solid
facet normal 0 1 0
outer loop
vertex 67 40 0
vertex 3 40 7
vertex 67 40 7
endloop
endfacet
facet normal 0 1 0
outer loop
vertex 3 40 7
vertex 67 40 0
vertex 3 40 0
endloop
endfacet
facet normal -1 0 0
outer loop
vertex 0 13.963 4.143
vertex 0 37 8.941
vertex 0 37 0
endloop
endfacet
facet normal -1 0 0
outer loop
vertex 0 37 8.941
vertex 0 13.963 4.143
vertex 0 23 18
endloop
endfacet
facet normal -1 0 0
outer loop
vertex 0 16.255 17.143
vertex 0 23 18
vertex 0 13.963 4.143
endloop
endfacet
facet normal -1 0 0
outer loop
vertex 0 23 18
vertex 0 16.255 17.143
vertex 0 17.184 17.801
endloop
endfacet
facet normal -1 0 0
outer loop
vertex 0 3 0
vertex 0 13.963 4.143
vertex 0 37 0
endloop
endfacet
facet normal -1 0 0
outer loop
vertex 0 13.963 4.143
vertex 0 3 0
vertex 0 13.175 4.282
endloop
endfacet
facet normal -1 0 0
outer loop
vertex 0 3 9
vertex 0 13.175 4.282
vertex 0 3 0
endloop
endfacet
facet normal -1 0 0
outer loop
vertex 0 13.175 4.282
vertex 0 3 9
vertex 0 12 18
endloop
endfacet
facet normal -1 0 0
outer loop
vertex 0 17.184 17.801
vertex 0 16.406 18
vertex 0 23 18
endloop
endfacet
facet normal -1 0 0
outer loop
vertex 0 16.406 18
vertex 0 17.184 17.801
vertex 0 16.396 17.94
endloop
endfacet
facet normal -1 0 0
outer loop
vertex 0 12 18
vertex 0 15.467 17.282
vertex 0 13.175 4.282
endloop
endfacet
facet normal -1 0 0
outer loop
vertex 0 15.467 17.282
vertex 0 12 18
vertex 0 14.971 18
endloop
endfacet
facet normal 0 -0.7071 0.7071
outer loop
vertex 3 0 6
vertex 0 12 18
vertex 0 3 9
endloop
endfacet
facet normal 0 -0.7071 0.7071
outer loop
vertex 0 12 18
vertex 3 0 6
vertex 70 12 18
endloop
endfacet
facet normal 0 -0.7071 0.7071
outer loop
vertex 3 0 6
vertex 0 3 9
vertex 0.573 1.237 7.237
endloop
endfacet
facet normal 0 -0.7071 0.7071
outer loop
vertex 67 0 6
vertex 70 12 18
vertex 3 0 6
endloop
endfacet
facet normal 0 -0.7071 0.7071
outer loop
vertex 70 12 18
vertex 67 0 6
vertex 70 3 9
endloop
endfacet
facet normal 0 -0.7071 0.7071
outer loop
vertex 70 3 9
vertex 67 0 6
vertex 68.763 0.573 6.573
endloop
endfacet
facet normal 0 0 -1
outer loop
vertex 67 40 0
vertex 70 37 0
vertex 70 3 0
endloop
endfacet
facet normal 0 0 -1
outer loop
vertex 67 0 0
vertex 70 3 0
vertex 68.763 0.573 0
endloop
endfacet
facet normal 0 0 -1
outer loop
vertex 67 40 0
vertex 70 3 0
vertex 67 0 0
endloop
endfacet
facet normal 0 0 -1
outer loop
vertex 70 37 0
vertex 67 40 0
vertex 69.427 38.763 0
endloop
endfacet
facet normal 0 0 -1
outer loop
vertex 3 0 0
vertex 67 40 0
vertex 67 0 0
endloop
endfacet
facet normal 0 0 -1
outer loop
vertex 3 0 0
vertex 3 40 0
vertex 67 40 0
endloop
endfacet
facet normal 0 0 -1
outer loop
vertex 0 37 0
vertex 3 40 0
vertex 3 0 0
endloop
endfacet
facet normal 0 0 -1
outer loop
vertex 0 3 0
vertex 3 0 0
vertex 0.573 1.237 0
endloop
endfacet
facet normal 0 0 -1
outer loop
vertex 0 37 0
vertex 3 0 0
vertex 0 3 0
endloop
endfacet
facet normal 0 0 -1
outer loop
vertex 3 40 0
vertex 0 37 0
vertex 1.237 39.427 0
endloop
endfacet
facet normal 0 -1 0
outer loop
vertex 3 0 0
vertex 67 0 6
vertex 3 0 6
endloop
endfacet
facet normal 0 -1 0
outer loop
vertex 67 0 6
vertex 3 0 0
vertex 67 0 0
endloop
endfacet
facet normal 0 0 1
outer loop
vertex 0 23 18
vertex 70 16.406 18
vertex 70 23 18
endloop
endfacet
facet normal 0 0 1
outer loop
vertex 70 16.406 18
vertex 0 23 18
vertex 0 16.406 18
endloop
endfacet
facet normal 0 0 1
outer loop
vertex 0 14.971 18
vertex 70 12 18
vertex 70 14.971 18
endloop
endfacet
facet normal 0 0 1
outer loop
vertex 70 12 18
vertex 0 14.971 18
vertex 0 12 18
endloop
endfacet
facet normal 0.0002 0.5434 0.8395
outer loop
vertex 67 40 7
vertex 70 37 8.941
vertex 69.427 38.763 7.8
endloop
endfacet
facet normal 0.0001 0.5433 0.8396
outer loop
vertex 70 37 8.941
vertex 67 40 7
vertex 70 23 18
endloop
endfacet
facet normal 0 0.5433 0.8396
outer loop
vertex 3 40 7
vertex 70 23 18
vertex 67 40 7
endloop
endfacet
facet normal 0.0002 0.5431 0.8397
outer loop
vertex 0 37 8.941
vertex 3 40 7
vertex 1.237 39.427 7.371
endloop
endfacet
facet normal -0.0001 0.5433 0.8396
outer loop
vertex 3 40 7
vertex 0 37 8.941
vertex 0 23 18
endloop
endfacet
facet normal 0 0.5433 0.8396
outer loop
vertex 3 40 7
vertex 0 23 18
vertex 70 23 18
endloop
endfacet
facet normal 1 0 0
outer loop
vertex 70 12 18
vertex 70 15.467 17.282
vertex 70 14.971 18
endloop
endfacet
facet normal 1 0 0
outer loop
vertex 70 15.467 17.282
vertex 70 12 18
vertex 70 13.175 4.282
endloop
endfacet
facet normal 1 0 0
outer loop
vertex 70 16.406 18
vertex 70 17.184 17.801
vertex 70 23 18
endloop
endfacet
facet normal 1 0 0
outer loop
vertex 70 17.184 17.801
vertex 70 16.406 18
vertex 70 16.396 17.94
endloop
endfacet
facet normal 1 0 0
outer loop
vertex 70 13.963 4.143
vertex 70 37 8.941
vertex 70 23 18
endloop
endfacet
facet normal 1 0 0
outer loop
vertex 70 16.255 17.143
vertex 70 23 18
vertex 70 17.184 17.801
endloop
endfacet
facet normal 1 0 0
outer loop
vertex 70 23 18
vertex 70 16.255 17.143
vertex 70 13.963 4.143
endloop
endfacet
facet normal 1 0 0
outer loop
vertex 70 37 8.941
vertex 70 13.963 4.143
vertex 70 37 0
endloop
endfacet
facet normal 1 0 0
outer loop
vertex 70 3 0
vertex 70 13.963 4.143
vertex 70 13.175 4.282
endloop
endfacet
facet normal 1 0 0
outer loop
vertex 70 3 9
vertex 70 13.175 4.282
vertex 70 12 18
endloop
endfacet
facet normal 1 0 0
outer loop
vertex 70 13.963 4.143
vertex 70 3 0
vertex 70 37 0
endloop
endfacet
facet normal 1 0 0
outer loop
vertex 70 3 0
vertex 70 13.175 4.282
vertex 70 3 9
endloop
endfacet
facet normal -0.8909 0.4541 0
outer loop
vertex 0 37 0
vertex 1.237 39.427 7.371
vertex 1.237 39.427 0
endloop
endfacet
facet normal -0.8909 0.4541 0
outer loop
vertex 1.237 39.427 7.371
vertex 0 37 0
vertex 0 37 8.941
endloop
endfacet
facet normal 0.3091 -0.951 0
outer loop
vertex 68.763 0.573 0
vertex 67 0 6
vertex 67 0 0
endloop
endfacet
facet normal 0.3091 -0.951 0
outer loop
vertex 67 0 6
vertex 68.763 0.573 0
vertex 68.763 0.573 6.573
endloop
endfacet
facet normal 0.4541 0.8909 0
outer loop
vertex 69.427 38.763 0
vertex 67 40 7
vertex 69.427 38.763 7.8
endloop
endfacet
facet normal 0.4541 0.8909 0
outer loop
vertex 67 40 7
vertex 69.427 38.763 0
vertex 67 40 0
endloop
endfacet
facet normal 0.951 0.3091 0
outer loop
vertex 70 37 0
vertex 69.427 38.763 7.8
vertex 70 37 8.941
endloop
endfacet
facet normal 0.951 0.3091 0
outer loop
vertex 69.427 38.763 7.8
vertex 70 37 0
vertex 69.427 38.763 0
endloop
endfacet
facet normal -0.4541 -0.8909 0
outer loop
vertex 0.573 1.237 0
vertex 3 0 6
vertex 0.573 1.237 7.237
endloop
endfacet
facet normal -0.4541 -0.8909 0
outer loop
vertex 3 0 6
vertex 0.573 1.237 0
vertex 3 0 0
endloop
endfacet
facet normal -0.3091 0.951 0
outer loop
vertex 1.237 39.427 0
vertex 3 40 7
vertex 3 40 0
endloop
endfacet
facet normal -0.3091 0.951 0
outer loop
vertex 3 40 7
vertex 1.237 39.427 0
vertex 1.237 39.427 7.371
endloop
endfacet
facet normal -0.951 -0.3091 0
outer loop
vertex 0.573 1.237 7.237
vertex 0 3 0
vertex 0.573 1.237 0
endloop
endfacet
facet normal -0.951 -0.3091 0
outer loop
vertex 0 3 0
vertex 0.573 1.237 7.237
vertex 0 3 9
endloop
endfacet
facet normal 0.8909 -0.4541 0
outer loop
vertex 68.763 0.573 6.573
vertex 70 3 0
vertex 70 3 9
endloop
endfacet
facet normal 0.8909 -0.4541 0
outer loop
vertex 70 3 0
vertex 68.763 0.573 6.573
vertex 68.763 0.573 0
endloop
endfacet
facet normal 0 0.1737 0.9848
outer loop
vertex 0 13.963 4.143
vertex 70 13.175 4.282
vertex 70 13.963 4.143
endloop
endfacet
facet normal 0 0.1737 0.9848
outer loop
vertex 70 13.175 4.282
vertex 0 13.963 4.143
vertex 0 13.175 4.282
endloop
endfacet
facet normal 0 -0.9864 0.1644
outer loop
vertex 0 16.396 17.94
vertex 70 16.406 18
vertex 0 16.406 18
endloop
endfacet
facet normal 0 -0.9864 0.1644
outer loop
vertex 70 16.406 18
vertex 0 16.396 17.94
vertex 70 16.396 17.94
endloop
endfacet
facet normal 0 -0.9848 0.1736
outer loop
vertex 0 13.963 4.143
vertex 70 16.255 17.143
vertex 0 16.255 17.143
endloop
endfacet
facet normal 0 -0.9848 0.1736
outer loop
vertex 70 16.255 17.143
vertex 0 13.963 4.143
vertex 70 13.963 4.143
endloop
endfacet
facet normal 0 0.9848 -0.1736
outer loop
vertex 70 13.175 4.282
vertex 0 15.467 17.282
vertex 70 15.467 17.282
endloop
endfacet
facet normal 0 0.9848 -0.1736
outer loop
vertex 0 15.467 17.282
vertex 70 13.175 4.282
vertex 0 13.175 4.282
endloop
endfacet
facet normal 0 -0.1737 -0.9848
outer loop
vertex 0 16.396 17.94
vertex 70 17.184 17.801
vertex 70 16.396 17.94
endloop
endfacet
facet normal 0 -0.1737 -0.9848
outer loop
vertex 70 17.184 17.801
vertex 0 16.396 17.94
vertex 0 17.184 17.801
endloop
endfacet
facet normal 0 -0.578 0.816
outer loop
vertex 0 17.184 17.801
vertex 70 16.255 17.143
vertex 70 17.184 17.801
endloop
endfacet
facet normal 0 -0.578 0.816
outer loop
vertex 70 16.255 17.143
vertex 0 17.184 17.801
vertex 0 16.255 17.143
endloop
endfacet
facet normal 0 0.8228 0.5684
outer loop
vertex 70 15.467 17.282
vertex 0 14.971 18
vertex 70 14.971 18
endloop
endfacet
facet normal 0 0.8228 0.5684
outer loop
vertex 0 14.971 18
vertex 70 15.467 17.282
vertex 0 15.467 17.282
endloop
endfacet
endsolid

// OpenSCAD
// Stand for A6 landscape cards (148 x 105 mm, 250 g card stock).
// The slot leans back by `tilt` degrees. Print lying on the flat bottom,
// no supports needed. Set grid_x/grid_y > 1 to get a whole print plate.
// Tested with OpenSCAD 2021.01.

/* [Card] */
card_t      = 0.3;      // card stock thickness (250 g ~ 0.3 mm, laminated ~0.5-0.8 mm)
slot_extra  = 0.5;      // extra slot width so the card slides in easily
tilt        = 10;       // backward tilt in degrees

/* [Stand] */
len         = 70;       // along the card width
depth       = 40;       // front to back
front_h     = 6;        // height at the front edge
back_h      = 18;       // height at the slot
back_end_h  = 7;        // height at the back edge
slot_y      = 16;       // slot position from the front edge (at the top)
slot_depth  = 14;       // measured along the slot
corner_r    = 3;

/* [Plate] */
grid_x      = 1;
grid_y      = 1;
gap         = 6;

slot_w = card_t + slot_extra;
echo(str("stand ", len, " x ", depth, " x ", back_h, " mm, slot ", slot_w, " mm"));

module profile() {
    // side view in the y/z plane: low front, ramp up to the slot, ramp down behind it
    polygon([[0, 0], [depth, 0], [depth, back_end_h], [slot_y + 7, back_h],
             [slot_y - 4, back_h], [0, front_h]]);
}

module stand() {
    difference() {
        intersection() {
            rotate([90, 0, 90]) linear_extrude(len) profile();
            // round the corners in the footprint
            translate([corner_r, corner_r, -1]) linear_extrude(back_h + 2)
                offset(r = corner_r) square([len - 2 * corner_r, depth - 2 * corner_r]);
        }
        // slot, tilted backwards (top leans to +y)
        translate([-1, slot_y, back_h]) rotate([-tilt, 0, 0])
            translate([0, -slot_w / 2, -slot_depth]) cube([len + 2, slot_w, slot_depth + 10]);
        // small lead-in at the slot opening
        translate([-1, slot_y, back_h]) rotate([-tilt, 0, 0]) rotate([0, 90, 0])
            linear_extrude(len + 2) polygon([[-0.01, -slot_w / 2 - 0.8], [-0.01, slot_w / 2 + 0.8], [0.8, slot_w / 2], [0.8, -slot_w / 2]]);
    }
}

for (i = [0 : grid_x - 1], j = [0 : grid_y - 1])
    translate([i * (len + gap), j * (depth + gap), 0]) stand();
